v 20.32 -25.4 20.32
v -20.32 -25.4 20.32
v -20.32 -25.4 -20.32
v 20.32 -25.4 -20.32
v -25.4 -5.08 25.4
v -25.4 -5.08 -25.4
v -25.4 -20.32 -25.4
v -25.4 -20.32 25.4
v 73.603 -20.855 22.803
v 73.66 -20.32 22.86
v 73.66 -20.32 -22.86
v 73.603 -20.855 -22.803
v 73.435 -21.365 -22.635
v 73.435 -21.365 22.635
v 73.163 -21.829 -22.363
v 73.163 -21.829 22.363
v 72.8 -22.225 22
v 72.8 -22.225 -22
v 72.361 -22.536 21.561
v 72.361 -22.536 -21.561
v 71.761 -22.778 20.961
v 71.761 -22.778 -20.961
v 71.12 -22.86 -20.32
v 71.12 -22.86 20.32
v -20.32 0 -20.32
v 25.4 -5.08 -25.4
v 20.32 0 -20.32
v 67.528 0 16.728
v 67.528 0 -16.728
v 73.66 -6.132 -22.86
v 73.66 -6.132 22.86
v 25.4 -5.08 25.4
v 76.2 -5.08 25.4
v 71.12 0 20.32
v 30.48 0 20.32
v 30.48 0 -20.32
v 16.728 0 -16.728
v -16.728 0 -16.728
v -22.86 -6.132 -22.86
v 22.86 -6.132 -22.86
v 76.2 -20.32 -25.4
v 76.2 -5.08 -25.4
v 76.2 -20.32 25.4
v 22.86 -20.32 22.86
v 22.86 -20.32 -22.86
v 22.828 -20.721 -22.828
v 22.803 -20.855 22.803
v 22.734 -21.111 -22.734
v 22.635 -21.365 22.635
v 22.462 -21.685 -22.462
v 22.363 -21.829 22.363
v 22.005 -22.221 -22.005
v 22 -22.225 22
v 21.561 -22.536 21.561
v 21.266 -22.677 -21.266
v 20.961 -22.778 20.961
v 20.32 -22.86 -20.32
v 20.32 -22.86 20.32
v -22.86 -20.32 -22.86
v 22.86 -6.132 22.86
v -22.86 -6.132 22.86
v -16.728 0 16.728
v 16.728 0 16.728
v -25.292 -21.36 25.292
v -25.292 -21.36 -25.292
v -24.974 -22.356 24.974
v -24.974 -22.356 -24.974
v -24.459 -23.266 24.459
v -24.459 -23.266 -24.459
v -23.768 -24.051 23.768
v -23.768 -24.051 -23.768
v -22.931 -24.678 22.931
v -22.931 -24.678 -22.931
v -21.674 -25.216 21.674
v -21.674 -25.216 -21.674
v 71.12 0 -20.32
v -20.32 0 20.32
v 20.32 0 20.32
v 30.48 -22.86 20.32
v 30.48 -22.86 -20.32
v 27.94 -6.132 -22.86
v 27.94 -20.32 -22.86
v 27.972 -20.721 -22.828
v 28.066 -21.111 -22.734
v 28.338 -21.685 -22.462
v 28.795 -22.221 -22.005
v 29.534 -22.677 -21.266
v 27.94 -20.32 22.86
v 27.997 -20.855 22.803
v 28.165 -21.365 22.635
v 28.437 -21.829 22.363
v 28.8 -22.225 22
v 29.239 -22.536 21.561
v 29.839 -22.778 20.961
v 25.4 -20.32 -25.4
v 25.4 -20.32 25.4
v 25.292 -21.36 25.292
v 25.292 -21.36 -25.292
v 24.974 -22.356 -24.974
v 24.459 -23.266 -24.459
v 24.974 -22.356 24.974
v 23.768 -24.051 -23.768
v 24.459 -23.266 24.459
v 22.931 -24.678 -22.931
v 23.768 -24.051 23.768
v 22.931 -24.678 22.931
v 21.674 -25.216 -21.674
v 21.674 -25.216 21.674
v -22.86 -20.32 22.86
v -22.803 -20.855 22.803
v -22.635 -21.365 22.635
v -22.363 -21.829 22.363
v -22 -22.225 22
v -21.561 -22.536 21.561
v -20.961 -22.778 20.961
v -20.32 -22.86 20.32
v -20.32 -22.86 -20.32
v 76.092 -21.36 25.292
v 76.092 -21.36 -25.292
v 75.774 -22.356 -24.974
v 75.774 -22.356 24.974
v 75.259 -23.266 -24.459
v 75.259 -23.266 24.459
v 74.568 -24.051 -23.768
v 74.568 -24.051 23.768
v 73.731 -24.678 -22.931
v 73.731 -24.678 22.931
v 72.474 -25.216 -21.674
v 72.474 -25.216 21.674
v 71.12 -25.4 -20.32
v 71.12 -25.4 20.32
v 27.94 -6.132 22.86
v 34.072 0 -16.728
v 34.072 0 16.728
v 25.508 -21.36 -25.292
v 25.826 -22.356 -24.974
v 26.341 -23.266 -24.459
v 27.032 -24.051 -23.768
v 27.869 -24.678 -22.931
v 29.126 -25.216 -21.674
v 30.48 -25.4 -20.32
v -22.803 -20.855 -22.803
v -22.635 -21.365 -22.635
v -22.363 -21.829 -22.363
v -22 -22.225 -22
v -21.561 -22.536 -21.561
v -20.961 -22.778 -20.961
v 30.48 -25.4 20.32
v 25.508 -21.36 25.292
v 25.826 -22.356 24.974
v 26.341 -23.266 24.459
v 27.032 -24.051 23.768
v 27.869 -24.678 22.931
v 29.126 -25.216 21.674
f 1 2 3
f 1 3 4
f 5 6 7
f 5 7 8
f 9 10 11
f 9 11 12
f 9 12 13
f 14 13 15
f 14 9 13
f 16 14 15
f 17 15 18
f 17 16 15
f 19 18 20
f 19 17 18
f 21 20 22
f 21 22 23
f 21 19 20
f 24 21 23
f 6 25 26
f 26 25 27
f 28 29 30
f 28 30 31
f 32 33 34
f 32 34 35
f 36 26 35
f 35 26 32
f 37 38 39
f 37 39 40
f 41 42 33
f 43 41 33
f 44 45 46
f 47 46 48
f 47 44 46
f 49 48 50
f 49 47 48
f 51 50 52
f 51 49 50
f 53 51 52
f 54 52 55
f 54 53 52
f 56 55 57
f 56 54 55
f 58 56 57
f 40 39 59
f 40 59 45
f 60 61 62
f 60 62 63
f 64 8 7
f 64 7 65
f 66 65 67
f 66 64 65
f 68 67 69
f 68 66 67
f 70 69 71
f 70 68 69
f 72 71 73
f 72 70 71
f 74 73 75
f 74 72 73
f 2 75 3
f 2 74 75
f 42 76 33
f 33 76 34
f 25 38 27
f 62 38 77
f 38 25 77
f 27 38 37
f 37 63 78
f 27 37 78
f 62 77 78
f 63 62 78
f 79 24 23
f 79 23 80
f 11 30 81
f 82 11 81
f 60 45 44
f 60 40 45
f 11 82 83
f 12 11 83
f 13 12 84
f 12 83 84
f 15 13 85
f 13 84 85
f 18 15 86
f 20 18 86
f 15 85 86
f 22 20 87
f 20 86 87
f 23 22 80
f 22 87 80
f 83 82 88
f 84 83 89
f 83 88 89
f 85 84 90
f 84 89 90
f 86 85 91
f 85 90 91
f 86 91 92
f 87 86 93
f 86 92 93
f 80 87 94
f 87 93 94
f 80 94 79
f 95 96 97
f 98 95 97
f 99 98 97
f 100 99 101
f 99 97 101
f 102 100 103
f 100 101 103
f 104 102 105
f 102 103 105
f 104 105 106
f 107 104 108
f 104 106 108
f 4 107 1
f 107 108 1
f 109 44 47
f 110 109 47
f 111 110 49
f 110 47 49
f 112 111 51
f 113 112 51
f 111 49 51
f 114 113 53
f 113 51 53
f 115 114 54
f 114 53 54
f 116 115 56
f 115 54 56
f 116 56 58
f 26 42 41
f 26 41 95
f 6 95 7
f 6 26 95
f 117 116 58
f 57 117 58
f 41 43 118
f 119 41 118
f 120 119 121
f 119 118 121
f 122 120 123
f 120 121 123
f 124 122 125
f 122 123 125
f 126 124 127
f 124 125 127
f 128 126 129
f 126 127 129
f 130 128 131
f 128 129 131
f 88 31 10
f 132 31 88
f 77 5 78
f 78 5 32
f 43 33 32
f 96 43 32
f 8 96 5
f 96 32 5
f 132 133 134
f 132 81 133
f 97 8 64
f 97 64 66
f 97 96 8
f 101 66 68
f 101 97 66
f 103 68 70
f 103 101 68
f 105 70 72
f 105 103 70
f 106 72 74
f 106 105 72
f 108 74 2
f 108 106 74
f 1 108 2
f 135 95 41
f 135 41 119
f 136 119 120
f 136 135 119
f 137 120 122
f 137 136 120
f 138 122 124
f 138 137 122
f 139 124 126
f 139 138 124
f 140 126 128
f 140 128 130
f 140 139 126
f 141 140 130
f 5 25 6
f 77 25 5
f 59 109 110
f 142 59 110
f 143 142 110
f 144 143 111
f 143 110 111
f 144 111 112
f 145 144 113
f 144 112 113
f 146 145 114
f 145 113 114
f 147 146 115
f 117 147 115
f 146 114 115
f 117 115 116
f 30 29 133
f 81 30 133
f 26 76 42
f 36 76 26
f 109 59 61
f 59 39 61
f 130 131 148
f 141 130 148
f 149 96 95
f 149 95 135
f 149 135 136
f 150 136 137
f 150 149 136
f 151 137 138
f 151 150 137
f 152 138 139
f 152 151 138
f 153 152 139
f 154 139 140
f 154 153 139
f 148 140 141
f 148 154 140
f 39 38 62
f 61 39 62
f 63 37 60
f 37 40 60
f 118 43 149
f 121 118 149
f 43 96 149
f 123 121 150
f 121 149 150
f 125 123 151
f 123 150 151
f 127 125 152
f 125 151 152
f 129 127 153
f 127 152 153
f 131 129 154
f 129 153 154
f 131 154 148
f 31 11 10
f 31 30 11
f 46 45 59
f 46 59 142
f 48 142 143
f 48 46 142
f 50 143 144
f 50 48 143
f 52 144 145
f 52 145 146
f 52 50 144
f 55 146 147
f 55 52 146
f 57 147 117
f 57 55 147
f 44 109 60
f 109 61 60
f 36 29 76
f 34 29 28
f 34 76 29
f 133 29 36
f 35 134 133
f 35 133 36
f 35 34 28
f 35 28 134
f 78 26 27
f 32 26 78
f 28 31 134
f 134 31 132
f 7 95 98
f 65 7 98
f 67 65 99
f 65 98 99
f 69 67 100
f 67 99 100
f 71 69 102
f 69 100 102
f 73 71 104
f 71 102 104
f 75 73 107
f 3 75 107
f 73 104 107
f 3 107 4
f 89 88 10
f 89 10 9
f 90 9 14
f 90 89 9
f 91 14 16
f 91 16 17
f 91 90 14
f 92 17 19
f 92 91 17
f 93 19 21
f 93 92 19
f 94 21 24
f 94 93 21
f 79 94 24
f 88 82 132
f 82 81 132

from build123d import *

# Parameters (mm, degrees)
F0_W     = 50.8
F0_H     = 50.8
F1_DEPTH = 25.4
F3_R     = 5.08
F4_SIZE  = 5.08
F5_T     = -2.54


# Not quite as in the source:
# - a feature of the source that left no trace in its solid (it failed there, or was rolled back) is left out


with BuildPart() as f1:
    # F0 (on Front) → F1 (new body)
    with BuildSketch(Plane.XZ):
        Rectangle(F0_W, F0_H)
    extrude(amount=F1_DEPTH)

    # F3
    f3_edges = [f1.edges().sort_by_distance(p)[0] for p in [
        (0, -25.4, 25.4),
        (-25.4, -25.4, 0),
        (0, -25.4, -25.4),
        (25.4, -25.4, 0),
    ]]
    fillet(f3_edges, radius=F3_R)

    # F4
    f4_edges = [f1.edges().sort_by_distance(p)[0] for p in [
        (0, 0, 25.4),
        (-25.4, 0, 0),
        (0, 0, -25.4),
        (25.4, 0, 0),
    ]]
    chamfer(f4_edges, length=F4_SIZE)

    # F5
    f5_openings = [f1.faces().sort_by_distance(p)[0] for p in [
        (0, 0, 0),
    ]]
    offset(amount=F5_T, openings=f5_openings)

    # F6: F1 across face


with BuildPart() as f1_1:
    add(f1.part)
    add(f1.part.mirror(Plane(origin=(25.4, -12.7, 0), x_dir=(0, 1, 0), z_dir=(1, 0, 0))))


solid = f1_1.part
